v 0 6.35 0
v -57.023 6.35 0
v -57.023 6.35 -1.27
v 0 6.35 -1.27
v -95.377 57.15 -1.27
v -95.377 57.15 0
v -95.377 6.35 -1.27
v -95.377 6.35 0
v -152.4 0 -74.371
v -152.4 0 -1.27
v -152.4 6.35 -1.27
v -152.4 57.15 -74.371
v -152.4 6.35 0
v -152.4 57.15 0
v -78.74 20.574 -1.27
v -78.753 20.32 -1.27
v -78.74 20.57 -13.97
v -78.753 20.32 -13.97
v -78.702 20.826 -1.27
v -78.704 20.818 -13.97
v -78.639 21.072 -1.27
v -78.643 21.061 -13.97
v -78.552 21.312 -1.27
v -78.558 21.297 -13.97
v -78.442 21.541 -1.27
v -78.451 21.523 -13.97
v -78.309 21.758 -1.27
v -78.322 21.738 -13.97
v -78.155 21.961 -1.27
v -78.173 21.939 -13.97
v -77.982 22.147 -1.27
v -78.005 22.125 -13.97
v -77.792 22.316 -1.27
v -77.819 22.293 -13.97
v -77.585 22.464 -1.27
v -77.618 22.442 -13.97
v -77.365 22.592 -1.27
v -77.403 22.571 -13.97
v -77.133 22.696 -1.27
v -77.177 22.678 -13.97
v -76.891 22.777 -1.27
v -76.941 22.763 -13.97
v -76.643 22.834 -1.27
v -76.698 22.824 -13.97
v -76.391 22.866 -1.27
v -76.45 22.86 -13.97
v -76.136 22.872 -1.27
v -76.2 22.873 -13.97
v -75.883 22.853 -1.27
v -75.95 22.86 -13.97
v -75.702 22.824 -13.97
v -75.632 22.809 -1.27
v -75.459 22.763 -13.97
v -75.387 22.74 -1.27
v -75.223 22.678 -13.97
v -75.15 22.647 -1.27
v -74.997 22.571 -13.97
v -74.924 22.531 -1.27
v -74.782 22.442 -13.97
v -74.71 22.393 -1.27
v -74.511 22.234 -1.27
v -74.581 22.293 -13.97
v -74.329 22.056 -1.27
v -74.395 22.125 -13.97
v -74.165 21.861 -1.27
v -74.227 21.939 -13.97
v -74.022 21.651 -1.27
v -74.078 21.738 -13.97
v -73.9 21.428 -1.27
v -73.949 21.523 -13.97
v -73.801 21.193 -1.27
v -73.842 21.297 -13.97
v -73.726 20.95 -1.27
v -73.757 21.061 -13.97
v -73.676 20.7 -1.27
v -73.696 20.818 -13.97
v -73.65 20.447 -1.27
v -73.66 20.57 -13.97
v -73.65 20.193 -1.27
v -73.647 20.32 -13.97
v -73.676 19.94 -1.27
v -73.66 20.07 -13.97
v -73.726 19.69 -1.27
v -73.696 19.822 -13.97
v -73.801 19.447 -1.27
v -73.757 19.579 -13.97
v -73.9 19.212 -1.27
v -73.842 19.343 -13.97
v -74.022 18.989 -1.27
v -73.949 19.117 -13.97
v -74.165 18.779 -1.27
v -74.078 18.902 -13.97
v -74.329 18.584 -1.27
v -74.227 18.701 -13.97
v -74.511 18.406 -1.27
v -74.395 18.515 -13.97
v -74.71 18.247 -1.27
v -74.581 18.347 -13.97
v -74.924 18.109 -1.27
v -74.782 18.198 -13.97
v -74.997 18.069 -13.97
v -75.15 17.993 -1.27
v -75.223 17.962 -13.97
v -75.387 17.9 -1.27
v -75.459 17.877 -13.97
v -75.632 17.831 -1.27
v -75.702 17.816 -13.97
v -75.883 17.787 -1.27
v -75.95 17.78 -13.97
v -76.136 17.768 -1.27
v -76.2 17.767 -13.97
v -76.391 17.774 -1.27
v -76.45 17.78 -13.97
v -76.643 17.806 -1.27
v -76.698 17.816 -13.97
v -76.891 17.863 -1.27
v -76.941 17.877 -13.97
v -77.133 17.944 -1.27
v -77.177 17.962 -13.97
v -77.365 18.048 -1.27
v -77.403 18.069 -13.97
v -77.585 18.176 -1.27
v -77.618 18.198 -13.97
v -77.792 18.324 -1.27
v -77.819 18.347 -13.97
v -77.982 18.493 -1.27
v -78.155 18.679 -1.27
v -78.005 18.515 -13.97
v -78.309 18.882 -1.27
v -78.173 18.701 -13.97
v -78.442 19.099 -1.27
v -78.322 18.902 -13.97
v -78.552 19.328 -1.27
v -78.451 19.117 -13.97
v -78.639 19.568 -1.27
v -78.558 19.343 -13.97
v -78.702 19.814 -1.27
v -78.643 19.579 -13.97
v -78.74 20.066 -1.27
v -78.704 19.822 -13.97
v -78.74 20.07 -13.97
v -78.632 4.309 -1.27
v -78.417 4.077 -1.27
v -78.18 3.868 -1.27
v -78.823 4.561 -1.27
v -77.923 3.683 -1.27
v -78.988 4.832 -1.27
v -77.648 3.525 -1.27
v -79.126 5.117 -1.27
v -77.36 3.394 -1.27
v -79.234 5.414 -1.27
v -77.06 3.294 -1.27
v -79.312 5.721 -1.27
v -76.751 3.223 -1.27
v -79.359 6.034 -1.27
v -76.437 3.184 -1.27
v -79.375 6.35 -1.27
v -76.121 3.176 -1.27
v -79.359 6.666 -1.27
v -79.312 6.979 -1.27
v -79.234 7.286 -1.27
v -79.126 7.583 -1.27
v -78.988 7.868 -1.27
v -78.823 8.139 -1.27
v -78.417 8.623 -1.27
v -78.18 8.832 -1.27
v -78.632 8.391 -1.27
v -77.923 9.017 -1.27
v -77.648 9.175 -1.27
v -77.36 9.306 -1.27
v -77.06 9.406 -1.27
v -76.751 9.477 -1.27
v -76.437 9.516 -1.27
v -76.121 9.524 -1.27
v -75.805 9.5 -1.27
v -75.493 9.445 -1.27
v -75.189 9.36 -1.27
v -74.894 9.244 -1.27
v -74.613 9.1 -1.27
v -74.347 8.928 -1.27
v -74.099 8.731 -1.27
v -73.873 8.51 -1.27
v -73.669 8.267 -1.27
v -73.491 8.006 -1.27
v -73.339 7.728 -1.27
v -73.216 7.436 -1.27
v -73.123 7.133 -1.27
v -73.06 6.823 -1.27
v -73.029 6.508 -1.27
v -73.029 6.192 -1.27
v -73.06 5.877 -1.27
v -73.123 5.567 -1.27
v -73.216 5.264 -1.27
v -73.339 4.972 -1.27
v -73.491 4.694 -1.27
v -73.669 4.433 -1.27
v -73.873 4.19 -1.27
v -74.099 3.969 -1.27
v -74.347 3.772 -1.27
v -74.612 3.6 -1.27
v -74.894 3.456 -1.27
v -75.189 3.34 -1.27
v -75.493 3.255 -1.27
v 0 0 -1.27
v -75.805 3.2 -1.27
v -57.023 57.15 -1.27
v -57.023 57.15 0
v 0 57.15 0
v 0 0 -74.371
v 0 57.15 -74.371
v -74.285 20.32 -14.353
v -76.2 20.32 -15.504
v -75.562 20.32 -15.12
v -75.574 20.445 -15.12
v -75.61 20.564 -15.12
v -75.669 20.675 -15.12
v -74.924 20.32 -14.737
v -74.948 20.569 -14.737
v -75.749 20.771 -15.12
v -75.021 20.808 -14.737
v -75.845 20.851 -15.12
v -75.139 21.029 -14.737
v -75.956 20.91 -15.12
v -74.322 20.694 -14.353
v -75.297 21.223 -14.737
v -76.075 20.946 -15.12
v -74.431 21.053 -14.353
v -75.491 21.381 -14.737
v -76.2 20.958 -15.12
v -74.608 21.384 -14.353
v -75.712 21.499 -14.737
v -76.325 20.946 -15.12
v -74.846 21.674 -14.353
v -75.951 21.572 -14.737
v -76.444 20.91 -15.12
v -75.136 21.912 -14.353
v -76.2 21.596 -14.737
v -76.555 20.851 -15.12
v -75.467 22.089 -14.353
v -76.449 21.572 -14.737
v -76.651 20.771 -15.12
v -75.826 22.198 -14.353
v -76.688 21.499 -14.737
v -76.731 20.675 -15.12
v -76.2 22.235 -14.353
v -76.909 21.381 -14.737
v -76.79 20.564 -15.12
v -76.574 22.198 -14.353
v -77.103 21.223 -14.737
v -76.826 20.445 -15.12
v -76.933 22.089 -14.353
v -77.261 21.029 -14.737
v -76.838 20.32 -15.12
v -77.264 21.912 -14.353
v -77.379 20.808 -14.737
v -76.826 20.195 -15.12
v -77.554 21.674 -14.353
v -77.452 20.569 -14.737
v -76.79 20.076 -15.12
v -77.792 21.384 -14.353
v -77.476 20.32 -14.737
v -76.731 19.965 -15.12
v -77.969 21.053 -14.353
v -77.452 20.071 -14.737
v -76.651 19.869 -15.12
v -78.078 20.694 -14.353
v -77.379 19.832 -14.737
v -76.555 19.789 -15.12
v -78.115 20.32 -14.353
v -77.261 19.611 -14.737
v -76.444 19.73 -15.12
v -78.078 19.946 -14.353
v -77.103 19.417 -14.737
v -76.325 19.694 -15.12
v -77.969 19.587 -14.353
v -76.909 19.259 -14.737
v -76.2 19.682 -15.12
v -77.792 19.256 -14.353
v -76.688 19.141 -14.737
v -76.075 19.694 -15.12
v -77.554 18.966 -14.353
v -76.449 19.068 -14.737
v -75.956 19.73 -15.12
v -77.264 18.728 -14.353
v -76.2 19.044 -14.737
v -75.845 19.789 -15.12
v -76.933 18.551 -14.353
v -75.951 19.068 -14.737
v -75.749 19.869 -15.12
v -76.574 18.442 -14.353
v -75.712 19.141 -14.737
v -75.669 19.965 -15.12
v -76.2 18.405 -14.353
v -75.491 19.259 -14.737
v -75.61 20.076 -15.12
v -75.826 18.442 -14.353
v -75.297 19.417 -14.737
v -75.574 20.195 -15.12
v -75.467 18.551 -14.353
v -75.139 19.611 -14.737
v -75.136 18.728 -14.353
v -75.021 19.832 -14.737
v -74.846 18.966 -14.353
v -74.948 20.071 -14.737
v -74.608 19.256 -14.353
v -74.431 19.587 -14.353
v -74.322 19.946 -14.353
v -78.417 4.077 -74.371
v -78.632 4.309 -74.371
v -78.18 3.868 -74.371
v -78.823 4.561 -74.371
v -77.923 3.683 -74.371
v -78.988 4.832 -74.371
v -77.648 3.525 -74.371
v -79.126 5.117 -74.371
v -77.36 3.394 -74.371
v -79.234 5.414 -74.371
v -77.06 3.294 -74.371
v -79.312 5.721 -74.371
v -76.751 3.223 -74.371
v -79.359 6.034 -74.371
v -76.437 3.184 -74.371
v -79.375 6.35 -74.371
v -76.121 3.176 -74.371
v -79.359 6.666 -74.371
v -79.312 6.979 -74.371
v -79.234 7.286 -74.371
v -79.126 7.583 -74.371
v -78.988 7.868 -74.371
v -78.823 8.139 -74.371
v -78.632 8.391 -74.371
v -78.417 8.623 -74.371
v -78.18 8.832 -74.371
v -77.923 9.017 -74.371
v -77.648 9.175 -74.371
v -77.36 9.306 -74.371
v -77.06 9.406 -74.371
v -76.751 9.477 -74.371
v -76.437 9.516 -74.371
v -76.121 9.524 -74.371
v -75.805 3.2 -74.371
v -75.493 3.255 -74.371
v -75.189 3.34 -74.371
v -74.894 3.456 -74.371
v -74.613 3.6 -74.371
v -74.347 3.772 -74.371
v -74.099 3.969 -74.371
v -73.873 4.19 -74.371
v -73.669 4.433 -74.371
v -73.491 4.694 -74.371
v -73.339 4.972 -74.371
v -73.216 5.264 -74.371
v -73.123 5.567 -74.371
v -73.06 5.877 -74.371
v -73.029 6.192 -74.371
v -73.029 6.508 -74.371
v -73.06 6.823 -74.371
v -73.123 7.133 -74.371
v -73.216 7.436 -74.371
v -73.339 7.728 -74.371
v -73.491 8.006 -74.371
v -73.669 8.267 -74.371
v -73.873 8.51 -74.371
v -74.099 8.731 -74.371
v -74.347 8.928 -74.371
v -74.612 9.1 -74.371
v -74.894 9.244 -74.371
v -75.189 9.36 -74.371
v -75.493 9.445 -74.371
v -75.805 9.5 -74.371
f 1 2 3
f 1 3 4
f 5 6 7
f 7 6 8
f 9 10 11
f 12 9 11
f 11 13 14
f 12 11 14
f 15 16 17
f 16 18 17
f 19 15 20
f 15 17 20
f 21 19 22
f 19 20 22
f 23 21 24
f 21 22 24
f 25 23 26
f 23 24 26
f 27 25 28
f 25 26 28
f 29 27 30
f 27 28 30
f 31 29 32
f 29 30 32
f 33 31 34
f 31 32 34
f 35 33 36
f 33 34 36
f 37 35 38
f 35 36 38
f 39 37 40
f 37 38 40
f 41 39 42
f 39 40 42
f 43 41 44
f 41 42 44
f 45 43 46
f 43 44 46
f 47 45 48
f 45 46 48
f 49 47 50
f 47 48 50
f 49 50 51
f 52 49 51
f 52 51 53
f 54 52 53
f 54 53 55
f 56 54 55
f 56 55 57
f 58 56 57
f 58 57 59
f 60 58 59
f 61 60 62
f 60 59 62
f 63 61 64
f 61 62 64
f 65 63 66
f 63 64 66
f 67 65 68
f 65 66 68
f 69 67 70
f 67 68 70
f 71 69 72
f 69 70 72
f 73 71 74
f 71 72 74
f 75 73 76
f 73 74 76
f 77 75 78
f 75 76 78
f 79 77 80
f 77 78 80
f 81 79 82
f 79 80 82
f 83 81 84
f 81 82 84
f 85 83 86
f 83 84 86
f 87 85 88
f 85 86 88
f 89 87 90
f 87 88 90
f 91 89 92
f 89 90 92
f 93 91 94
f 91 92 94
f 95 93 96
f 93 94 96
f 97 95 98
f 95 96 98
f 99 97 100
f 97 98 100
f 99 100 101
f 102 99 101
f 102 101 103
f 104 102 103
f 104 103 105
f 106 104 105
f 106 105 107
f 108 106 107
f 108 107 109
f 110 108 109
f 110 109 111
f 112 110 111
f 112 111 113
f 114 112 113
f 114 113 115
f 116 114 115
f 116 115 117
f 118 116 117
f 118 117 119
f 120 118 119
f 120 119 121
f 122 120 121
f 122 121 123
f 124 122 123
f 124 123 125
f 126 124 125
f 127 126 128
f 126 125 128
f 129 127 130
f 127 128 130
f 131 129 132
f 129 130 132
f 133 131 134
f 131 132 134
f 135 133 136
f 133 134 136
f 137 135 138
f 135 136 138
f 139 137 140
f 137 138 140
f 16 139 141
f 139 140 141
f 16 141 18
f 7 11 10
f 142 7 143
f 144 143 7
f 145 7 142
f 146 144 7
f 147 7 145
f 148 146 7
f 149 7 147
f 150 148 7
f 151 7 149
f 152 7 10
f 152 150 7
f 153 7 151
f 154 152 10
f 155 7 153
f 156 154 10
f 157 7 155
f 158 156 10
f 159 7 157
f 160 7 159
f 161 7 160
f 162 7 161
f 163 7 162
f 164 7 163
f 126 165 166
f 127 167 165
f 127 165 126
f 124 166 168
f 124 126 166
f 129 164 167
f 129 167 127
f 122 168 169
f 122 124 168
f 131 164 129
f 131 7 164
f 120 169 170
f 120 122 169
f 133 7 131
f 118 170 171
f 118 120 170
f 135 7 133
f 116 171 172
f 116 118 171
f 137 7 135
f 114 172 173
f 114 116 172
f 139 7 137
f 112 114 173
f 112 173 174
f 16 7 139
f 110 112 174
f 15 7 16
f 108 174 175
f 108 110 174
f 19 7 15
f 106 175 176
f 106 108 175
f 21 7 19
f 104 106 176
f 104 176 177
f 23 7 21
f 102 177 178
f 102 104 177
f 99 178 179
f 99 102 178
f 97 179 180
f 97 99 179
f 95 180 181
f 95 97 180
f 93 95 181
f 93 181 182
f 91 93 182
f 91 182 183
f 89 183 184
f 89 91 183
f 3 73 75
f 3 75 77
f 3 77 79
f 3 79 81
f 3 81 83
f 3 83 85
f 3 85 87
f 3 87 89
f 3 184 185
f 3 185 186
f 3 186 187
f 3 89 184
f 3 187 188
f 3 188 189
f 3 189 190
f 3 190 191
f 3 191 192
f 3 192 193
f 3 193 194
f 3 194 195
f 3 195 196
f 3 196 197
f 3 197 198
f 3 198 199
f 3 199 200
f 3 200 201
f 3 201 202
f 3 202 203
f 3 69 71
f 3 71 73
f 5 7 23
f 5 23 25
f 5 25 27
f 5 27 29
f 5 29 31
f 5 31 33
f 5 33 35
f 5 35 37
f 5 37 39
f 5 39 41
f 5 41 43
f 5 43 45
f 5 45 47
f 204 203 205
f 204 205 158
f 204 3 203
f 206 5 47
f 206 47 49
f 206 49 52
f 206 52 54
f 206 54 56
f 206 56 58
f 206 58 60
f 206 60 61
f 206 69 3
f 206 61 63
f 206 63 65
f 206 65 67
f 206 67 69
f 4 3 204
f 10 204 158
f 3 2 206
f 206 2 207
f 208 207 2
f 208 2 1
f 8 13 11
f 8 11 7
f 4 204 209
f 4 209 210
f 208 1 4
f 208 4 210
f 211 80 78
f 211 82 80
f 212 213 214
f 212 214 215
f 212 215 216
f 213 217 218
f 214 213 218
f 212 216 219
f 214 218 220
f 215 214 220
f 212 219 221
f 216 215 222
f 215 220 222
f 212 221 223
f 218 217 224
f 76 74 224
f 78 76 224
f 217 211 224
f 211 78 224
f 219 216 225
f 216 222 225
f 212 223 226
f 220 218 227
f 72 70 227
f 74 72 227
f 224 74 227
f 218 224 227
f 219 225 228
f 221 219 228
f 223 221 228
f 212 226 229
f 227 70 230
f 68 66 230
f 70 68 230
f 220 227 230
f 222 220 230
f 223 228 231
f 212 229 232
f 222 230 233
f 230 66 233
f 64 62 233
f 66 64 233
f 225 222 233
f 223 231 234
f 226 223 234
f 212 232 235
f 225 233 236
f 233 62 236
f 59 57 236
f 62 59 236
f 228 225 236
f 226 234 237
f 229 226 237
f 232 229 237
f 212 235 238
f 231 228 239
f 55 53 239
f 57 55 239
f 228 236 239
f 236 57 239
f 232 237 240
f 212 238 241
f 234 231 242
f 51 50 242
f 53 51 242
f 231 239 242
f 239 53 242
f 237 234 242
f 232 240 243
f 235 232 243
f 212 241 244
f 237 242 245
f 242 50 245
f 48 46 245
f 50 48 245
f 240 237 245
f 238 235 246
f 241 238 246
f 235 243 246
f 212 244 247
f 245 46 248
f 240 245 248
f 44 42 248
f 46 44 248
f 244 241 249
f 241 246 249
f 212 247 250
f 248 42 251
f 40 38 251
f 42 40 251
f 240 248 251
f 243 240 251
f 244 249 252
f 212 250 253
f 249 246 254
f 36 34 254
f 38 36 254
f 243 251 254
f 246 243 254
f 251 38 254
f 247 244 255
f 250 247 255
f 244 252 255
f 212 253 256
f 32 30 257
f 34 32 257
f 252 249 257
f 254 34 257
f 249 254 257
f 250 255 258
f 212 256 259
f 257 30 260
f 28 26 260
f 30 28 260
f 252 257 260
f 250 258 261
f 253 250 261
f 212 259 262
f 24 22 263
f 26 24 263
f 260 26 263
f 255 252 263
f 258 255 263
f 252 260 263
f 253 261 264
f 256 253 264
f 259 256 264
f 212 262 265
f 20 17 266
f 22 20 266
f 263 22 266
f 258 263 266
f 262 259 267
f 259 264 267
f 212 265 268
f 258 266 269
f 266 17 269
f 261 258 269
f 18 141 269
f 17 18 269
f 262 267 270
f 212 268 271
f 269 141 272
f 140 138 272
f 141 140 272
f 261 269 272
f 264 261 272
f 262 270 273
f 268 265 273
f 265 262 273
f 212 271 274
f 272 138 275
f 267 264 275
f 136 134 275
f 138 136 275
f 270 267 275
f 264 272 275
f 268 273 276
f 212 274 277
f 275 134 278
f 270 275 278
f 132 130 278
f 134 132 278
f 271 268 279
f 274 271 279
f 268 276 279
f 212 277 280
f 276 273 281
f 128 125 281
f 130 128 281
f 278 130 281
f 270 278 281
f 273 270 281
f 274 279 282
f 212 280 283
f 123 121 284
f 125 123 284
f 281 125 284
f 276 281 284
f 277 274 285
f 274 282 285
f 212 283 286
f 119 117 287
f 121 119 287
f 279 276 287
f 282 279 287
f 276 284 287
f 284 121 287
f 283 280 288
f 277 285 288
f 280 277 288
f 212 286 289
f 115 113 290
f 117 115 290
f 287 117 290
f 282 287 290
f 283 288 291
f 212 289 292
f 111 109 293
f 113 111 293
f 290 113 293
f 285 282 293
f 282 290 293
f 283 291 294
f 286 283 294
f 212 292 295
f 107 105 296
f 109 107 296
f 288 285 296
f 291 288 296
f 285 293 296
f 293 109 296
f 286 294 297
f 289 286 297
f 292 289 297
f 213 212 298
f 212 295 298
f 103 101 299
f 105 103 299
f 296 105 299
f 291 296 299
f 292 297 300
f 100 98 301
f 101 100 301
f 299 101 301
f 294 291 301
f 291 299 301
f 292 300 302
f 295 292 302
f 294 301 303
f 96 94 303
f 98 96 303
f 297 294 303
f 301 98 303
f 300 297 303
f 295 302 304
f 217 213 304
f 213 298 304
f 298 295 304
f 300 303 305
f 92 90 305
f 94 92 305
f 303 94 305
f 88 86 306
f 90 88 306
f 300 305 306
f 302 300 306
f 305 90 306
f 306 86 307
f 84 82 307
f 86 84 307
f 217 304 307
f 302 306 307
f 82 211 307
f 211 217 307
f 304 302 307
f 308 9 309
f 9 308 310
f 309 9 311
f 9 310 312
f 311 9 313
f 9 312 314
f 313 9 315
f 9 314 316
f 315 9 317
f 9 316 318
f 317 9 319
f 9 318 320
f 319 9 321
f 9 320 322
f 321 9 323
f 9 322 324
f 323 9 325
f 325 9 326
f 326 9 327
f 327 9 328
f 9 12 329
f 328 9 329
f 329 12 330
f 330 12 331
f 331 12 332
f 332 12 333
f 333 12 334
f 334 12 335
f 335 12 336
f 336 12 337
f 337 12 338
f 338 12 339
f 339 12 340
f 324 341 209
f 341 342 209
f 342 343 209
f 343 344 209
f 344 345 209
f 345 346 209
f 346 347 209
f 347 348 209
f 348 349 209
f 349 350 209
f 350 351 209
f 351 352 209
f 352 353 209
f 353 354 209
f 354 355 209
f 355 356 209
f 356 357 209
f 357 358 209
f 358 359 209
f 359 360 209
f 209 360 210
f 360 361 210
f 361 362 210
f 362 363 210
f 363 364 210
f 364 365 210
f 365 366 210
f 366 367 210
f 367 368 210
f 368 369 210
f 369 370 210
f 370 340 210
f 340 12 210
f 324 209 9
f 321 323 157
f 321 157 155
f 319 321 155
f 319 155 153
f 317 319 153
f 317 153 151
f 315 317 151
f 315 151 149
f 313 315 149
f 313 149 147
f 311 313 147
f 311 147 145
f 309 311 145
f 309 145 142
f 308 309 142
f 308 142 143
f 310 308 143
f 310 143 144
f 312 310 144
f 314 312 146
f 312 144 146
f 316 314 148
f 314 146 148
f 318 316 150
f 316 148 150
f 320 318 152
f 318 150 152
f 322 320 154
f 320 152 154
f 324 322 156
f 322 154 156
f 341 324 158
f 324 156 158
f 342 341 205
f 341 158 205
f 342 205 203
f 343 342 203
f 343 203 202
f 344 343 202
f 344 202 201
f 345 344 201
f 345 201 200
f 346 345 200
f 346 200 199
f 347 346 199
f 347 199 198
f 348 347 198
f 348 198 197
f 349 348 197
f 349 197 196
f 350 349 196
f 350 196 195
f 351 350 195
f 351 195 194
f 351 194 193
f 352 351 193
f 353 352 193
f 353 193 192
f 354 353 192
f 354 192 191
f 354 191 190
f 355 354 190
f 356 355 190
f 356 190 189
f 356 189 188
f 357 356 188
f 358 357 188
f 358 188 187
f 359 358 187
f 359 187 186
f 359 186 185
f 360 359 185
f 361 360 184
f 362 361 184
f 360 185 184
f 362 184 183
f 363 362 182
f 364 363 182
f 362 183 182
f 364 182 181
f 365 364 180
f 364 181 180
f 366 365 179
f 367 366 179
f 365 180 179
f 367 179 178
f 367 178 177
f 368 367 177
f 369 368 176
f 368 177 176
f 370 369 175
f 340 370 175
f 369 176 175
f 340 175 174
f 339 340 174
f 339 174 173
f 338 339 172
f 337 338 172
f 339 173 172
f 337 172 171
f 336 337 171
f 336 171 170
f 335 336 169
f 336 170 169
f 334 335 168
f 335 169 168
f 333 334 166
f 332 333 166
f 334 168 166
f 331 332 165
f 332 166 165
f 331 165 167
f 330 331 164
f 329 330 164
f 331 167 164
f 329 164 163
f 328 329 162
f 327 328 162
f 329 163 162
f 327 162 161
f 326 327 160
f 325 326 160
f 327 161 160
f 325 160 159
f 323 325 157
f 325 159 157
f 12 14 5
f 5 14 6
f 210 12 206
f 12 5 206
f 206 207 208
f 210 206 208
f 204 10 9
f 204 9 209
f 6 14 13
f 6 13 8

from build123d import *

# Parameters (mm, degrees)
F0_W     = 152.4
F0_H     = 57.15
F1_DEPTH = 74.3712
F2_W     = 152.4
F2_H     = 6.35
F3_DEPTH = 1.27
F5_DEPTH = 74.3722
F7_DEPTH = 1.27
F8_D     = 5.1054
F8_DEPTH = 12.7
F8_START = 1.27
F8_TIP   = 1.5338169022


with BuildPart() as f1:
    # F0 (on Top) → F1 (new body)
    with BuildSketch(Plane.XY):
        with Locations((-76.2, 28.575)):
            Rectangle(F0_W, F0_H)
    extrude(amount=-F1_DEPTH)

    # F2 (on face) → F3 (cut)
    with BuildSketch(Plane.XY):
        with Locations((-76.2, 3.175)):
            Rectangle(F2_W, F2_H)
    extrude(amount=-F3_DEPTH, mode=Mode.SUBTRACT)

    # F4 (on face) → F5 (cut, through all)
    with BuildSketch(Plane.XY):
        with BuildLine():
            Line((-79.375, 6.35), (-73.025, 6.35))
            ThreePointArc((-73.025, 6.35), (-76.2, 9.525), (-79.375, 6.35))
        make_face()
        with BuildLine():
            ThreePointArc((-79.375, 6.35), (-76.2, 3.175), (-73.025, 6.35))
            Line((-73.025, 6.35), (-79.375, 6.35))
        make_face()
    extrude(amount=-F5_DEPTH, mode=Mode.SUBTRACT)

    # F6 (on face) → F7 (cut)
    with BuildSketch(Plane.XY):
        with BuildLine():
            Line((-95.377, 6.35), (-79.375, 6.35))
            ThreePointArc((-79.375, 6.35), (-76.2, 9.525), (-73.025, 6.35))
            Line((-73.025, 6.35), (-57.023, 6.35))
            Line((-57.023, 6.35), (-57.023, 57.15))
            Line((-57.023, 57.15), (-95.377, 57.15))
            Line((-95.377, 57.15), (-95.377, 6.35))
        make_face()
    extrude(amount=-F7_DEPTH, mode=Mode.SUBTRACT)

    # F8
    # its depths count from where the whole tool has entered the part; down to there all is cleared
    with Locations(Plane.XY.offset(-F8_START)):
        with Locations((-76.2, 20.32)):
            Hole(F8_D / 2, depth=F8_DEPTH)
            with Locations((0, 0, -(F8_DEPTH + F8_TIP / 2))):  # 118° drill point
                Cone(0, F8_D / 2, F8_TIP, mode=Mode.SUBTRACT)


solid = f1.part
